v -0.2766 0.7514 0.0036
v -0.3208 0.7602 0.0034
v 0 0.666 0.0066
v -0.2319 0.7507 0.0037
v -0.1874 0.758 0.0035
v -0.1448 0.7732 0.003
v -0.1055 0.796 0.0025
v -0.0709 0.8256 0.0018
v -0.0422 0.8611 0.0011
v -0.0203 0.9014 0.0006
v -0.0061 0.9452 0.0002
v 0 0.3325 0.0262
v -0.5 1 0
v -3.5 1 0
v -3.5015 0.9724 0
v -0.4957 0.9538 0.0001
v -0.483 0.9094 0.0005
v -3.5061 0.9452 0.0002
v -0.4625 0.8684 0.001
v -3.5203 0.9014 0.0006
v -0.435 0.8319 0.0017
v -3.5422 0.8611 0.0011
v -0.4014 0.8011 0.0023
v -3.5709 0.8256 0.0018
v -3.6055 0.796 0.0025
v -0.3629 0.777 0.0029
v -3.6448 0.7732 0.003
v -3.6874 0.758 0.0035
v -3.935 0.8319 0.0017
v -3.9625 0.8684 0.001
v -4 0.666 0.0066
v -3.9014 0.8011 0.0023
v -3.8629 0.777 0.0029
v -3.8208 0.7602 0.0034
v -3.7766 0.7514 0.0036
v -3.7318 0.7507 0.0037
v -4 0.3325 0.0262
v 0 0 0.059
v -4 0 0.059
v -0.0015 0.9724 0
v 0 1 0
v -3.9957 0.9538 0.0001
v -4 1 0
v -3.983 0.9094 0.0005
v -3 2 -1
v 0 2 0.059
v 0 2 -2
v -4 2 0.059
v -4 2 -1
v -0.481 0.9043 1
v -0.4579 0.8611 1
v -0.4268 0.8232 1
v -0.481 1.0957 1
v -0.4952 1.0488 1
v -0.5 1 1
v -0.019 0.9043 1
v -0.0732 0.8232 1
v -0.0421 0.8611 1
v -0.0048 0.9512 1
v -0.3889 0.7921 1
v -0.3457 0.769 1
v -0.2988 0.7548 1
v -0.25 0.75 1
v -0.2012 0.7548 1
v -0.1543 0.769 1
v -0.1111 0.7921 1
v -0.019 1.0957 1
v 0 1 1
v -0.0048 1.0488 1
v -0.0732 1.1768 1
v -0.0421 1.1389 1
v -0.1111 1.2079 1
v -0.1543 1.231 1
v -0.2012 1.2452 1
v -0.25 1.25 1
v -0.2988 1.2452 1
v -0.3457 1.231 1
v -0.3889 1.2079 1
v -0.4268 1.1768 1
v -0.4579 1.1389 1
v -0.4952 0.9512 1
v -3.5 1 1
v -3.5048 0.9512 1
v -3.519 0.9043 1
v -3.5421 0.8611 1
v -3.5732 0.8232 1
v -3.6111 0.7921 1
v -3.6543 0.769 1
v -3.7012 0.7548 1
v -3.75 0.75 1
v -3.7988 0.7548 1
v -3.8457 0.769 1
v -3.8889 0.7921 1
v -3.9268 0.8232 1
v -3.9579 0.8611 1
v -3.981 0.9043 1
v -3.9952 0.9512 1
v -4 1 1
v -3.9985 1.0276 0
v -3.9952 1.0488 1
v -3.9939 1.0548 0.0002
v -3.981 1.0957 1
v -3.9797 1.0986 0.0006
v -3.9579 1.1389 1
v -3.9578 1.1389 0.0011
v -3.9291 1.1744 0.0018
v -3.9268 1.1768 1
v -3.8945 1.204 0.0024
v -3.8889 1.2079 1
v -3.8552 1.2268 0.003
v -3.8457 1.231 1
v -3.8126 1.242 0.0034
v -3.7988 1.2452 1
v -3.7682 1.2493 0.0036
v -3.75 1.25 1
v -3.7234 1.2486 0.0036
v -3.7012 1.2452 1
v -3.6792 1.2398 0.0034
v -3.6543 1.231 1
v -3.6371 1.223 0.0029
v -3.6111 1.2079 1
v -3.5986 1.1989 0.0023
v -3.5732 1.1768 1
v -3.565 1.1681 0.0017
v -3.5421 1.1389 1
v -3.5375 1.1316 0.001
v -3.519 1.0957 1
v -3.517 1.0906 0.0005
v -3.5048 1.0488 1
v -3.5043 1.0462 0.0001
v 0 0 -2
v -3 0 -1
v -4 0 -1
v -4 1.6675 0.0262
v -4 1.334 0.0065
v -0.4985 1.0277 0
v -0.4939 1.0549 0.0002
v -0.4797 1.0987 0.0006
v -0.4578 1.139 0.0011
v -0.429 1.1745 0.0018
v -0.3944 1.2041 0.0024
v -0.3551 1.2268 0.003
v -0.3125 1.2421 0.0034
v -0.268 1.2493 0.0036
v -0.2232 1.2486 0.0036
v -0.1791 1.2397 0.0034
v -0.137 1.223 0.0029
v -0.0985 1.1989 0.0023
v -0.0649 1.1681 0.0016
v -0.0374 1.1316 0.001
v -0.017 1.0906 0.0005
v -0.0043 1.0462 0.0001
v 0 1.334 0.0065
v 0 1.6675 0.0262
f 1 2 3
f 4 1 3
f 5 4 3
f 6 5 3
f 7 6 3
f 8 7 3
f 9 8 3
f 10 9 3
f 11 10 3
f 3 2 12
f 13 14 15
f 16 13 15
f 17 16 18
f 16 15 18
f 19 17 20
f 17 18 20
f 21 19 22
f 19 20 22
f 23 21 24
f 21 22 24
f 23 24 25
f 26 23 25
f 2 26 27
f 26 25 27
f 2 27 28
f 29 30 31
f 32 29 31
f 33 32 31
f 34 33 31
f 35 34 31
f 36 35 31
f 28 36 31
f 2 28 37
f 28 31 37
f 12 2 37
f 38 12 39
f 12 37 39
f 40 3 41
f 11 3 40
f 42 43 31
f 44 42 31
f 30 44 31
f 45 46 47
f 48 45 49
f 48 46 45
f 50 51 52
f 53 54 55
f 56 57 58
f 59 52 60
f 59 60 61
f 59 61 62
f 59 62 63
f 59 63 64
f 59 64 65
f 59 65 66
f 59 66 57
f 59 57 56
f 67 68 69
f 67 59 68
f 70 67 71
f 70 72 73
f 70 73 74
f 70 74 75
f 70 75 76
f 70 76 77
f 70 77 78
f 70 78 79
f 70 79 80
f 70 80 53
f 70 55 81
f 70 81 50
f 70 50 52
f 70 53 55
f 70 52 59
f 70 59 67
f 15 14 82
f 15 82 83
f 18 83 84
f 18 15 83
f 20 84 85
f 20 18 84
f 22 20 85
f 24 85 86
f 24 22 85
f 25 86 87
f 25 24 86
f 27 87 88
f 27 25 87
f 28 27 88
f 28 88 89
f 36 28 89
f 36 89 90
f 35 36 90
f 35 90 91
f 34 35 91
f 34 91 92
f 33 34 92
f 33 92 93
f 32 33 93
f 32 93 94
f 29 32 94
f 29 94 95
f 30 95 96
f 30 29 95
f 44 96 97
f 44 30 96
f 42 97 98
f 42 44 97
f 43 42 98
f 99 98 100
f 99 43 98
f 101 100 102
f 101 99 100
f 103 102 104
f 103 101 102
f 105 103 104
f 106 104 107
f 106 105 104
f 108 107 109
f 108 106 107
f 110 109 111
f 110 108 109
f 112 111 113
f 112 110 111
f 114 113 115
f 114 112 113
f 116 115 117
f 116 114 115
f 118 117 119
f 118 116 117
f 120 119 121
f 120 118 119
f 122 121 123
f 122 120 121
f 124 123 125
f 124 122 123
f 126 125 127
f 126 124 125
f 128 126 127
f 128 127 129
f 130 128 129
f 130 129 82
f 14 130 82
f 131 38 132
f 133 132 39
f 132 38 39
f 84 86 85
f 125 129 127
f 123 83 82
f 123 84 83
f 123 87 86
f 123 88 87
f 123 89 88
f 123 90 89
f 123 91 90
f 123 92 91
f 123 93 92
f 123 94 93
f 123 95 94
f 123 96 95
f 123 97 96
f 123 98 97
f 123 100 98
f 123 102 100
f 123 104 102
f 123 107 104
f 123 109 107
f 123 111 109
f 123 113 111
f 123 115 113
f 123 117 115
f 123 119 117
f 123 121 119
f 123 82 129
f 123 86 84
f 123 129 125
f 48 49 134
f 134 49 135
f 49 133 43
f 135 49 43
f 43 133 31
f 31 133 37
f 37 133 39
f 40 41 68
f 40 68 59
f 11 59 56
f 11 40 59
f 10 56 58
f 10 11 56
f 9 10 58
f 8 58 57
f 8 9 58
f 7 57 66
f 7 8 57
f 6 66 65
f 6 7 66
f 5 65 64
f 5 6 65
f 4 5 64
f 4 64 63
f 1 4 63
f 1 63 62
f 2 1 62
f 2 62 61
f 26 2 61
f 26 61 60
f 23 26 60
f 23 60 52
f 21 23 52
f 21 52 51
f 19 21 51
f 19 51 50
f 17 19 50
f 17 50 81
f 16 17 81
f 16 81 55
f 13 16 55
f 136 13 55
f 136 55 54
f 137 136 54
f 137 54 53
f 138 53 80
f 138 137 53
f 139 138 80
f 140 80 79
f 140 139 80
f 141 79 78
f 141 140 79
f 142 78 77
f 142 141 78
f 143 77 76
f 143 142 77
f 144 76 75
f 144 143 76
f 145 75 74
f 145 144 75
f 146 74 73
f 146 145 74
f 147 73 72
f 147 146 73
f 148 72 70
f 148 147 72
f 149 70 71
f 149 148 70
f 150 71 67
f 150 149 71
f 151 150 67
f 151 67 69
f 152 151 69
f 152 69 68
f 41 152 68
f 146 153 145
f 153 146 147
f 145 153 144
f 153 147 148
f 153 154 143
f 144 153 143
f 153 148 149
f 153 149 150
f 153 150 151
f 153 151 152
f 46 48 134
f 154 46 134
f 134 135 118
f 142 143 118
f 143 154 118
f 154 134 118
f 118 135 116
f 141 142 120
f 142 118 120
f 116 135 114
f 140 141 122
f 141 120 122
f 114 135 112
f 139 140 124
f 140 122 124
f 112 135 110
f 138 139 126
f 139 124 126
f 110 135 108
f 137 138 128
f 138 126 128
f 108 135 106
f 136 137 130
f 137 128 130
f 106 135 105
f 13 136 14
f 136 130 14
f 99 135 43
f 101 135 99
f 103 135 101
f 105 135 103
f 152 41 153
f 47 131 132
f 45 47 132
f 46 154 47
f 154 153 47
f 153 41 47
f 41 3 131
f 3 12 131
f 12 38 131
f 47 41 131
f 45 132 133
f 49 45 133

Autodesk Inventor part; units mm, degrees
ref_plane "YZ Plane" through (0, 0, 0) normal (1, 0, 0) x (0, 1, 0)
ref_plane "XZ Plane" through (0, 0, 0) normal (0, 1, 0) x (-1, 0, 0)
sketch "Sketch1" plane through (0, 0, 0) normal (0, 1, 0) x (-1, 0, 0)
  line L0 (0, 0) -> (0, -2)
  line L1 (0, -2) -> (3, -1)
  line L2 (3, -1) -> (4, -1)
  line L3 (4, -1) -> (4, 0)
  line L4 (4, 0) -> (0, 0)
  dimension "d0" = 1
  dimension "d1" = 2
  dimension "d2" = 1
  dimension "d3" = 4
extrude "Extrusion1" add sketch "Sketch1" along normal blind 2
sketch "Sketch2" plane through (-4, 0, -1) normal (-1, 0, 0) x (0, 0, 1)
  line L0 (0, 0) -> (1, 0) projected
  line L1 (1, 0) -> (1, 1)
  line L2 (1, 0) -> (1, 2) projected
  line L3 (1, 1) -> (9.5, 1)
  line L4 (1, 1) -> (9.5, 1) construction
  arc A0 (1, 1) -> (1.059, 0) centre (9.5, 1) ccw
  arc A1 (1.059, 2) -> (1, 1) centre (9.5, 1) ccw
  line L5 (1.059, 0) -> (1, 0)
  line L6 (0, 2) -> (1, 2) projected
  line L7 (1.059, 2) -> (1, 2)
  line L8 (1, 0) -> (1, 2)
  dimension "d6" = 1
  dimension "d7" = 8.5
  dimension "d8" = 0
extrude "Extrusion2" add sketch "Sketch2" against normal up to surface (4 mm away)
ref_plane "Work Plane1" through (-4, 1, 0) normal (0, 0, 1) x (1, 0, 0)
sketch "Sketch3" plane through (-4, 1, 0) normal (0, 0, 1) x (1, 0, 0)
  circle A0 centre (3.75, 0) radius 0.25
  line L0 (4, -1) -> (4, 1) projected
  dimension "d11" = 0.5
extrude "Extrusion3" add sketch "Sketch3" along normal blind 1
sketch "Sketch4" plane through (-4, 1, 0) normal (0, 0, 1) x (1, 0, 0)
  circle A0 centre (0.25, 0) radius 0.25
  line L0 (0, -1) -> (0, 1) projected
  circle A1 centre (3.75, 0) radius 0.25 projected
  point P0 (4, -1)
  point P1 (3.75, 0.25)
  dimension "d14" = 0.5
extrude "Extrusion4" add sketch "Sketch4" along normal up to surface (1 mm away) contours A0
properties part number "last"
